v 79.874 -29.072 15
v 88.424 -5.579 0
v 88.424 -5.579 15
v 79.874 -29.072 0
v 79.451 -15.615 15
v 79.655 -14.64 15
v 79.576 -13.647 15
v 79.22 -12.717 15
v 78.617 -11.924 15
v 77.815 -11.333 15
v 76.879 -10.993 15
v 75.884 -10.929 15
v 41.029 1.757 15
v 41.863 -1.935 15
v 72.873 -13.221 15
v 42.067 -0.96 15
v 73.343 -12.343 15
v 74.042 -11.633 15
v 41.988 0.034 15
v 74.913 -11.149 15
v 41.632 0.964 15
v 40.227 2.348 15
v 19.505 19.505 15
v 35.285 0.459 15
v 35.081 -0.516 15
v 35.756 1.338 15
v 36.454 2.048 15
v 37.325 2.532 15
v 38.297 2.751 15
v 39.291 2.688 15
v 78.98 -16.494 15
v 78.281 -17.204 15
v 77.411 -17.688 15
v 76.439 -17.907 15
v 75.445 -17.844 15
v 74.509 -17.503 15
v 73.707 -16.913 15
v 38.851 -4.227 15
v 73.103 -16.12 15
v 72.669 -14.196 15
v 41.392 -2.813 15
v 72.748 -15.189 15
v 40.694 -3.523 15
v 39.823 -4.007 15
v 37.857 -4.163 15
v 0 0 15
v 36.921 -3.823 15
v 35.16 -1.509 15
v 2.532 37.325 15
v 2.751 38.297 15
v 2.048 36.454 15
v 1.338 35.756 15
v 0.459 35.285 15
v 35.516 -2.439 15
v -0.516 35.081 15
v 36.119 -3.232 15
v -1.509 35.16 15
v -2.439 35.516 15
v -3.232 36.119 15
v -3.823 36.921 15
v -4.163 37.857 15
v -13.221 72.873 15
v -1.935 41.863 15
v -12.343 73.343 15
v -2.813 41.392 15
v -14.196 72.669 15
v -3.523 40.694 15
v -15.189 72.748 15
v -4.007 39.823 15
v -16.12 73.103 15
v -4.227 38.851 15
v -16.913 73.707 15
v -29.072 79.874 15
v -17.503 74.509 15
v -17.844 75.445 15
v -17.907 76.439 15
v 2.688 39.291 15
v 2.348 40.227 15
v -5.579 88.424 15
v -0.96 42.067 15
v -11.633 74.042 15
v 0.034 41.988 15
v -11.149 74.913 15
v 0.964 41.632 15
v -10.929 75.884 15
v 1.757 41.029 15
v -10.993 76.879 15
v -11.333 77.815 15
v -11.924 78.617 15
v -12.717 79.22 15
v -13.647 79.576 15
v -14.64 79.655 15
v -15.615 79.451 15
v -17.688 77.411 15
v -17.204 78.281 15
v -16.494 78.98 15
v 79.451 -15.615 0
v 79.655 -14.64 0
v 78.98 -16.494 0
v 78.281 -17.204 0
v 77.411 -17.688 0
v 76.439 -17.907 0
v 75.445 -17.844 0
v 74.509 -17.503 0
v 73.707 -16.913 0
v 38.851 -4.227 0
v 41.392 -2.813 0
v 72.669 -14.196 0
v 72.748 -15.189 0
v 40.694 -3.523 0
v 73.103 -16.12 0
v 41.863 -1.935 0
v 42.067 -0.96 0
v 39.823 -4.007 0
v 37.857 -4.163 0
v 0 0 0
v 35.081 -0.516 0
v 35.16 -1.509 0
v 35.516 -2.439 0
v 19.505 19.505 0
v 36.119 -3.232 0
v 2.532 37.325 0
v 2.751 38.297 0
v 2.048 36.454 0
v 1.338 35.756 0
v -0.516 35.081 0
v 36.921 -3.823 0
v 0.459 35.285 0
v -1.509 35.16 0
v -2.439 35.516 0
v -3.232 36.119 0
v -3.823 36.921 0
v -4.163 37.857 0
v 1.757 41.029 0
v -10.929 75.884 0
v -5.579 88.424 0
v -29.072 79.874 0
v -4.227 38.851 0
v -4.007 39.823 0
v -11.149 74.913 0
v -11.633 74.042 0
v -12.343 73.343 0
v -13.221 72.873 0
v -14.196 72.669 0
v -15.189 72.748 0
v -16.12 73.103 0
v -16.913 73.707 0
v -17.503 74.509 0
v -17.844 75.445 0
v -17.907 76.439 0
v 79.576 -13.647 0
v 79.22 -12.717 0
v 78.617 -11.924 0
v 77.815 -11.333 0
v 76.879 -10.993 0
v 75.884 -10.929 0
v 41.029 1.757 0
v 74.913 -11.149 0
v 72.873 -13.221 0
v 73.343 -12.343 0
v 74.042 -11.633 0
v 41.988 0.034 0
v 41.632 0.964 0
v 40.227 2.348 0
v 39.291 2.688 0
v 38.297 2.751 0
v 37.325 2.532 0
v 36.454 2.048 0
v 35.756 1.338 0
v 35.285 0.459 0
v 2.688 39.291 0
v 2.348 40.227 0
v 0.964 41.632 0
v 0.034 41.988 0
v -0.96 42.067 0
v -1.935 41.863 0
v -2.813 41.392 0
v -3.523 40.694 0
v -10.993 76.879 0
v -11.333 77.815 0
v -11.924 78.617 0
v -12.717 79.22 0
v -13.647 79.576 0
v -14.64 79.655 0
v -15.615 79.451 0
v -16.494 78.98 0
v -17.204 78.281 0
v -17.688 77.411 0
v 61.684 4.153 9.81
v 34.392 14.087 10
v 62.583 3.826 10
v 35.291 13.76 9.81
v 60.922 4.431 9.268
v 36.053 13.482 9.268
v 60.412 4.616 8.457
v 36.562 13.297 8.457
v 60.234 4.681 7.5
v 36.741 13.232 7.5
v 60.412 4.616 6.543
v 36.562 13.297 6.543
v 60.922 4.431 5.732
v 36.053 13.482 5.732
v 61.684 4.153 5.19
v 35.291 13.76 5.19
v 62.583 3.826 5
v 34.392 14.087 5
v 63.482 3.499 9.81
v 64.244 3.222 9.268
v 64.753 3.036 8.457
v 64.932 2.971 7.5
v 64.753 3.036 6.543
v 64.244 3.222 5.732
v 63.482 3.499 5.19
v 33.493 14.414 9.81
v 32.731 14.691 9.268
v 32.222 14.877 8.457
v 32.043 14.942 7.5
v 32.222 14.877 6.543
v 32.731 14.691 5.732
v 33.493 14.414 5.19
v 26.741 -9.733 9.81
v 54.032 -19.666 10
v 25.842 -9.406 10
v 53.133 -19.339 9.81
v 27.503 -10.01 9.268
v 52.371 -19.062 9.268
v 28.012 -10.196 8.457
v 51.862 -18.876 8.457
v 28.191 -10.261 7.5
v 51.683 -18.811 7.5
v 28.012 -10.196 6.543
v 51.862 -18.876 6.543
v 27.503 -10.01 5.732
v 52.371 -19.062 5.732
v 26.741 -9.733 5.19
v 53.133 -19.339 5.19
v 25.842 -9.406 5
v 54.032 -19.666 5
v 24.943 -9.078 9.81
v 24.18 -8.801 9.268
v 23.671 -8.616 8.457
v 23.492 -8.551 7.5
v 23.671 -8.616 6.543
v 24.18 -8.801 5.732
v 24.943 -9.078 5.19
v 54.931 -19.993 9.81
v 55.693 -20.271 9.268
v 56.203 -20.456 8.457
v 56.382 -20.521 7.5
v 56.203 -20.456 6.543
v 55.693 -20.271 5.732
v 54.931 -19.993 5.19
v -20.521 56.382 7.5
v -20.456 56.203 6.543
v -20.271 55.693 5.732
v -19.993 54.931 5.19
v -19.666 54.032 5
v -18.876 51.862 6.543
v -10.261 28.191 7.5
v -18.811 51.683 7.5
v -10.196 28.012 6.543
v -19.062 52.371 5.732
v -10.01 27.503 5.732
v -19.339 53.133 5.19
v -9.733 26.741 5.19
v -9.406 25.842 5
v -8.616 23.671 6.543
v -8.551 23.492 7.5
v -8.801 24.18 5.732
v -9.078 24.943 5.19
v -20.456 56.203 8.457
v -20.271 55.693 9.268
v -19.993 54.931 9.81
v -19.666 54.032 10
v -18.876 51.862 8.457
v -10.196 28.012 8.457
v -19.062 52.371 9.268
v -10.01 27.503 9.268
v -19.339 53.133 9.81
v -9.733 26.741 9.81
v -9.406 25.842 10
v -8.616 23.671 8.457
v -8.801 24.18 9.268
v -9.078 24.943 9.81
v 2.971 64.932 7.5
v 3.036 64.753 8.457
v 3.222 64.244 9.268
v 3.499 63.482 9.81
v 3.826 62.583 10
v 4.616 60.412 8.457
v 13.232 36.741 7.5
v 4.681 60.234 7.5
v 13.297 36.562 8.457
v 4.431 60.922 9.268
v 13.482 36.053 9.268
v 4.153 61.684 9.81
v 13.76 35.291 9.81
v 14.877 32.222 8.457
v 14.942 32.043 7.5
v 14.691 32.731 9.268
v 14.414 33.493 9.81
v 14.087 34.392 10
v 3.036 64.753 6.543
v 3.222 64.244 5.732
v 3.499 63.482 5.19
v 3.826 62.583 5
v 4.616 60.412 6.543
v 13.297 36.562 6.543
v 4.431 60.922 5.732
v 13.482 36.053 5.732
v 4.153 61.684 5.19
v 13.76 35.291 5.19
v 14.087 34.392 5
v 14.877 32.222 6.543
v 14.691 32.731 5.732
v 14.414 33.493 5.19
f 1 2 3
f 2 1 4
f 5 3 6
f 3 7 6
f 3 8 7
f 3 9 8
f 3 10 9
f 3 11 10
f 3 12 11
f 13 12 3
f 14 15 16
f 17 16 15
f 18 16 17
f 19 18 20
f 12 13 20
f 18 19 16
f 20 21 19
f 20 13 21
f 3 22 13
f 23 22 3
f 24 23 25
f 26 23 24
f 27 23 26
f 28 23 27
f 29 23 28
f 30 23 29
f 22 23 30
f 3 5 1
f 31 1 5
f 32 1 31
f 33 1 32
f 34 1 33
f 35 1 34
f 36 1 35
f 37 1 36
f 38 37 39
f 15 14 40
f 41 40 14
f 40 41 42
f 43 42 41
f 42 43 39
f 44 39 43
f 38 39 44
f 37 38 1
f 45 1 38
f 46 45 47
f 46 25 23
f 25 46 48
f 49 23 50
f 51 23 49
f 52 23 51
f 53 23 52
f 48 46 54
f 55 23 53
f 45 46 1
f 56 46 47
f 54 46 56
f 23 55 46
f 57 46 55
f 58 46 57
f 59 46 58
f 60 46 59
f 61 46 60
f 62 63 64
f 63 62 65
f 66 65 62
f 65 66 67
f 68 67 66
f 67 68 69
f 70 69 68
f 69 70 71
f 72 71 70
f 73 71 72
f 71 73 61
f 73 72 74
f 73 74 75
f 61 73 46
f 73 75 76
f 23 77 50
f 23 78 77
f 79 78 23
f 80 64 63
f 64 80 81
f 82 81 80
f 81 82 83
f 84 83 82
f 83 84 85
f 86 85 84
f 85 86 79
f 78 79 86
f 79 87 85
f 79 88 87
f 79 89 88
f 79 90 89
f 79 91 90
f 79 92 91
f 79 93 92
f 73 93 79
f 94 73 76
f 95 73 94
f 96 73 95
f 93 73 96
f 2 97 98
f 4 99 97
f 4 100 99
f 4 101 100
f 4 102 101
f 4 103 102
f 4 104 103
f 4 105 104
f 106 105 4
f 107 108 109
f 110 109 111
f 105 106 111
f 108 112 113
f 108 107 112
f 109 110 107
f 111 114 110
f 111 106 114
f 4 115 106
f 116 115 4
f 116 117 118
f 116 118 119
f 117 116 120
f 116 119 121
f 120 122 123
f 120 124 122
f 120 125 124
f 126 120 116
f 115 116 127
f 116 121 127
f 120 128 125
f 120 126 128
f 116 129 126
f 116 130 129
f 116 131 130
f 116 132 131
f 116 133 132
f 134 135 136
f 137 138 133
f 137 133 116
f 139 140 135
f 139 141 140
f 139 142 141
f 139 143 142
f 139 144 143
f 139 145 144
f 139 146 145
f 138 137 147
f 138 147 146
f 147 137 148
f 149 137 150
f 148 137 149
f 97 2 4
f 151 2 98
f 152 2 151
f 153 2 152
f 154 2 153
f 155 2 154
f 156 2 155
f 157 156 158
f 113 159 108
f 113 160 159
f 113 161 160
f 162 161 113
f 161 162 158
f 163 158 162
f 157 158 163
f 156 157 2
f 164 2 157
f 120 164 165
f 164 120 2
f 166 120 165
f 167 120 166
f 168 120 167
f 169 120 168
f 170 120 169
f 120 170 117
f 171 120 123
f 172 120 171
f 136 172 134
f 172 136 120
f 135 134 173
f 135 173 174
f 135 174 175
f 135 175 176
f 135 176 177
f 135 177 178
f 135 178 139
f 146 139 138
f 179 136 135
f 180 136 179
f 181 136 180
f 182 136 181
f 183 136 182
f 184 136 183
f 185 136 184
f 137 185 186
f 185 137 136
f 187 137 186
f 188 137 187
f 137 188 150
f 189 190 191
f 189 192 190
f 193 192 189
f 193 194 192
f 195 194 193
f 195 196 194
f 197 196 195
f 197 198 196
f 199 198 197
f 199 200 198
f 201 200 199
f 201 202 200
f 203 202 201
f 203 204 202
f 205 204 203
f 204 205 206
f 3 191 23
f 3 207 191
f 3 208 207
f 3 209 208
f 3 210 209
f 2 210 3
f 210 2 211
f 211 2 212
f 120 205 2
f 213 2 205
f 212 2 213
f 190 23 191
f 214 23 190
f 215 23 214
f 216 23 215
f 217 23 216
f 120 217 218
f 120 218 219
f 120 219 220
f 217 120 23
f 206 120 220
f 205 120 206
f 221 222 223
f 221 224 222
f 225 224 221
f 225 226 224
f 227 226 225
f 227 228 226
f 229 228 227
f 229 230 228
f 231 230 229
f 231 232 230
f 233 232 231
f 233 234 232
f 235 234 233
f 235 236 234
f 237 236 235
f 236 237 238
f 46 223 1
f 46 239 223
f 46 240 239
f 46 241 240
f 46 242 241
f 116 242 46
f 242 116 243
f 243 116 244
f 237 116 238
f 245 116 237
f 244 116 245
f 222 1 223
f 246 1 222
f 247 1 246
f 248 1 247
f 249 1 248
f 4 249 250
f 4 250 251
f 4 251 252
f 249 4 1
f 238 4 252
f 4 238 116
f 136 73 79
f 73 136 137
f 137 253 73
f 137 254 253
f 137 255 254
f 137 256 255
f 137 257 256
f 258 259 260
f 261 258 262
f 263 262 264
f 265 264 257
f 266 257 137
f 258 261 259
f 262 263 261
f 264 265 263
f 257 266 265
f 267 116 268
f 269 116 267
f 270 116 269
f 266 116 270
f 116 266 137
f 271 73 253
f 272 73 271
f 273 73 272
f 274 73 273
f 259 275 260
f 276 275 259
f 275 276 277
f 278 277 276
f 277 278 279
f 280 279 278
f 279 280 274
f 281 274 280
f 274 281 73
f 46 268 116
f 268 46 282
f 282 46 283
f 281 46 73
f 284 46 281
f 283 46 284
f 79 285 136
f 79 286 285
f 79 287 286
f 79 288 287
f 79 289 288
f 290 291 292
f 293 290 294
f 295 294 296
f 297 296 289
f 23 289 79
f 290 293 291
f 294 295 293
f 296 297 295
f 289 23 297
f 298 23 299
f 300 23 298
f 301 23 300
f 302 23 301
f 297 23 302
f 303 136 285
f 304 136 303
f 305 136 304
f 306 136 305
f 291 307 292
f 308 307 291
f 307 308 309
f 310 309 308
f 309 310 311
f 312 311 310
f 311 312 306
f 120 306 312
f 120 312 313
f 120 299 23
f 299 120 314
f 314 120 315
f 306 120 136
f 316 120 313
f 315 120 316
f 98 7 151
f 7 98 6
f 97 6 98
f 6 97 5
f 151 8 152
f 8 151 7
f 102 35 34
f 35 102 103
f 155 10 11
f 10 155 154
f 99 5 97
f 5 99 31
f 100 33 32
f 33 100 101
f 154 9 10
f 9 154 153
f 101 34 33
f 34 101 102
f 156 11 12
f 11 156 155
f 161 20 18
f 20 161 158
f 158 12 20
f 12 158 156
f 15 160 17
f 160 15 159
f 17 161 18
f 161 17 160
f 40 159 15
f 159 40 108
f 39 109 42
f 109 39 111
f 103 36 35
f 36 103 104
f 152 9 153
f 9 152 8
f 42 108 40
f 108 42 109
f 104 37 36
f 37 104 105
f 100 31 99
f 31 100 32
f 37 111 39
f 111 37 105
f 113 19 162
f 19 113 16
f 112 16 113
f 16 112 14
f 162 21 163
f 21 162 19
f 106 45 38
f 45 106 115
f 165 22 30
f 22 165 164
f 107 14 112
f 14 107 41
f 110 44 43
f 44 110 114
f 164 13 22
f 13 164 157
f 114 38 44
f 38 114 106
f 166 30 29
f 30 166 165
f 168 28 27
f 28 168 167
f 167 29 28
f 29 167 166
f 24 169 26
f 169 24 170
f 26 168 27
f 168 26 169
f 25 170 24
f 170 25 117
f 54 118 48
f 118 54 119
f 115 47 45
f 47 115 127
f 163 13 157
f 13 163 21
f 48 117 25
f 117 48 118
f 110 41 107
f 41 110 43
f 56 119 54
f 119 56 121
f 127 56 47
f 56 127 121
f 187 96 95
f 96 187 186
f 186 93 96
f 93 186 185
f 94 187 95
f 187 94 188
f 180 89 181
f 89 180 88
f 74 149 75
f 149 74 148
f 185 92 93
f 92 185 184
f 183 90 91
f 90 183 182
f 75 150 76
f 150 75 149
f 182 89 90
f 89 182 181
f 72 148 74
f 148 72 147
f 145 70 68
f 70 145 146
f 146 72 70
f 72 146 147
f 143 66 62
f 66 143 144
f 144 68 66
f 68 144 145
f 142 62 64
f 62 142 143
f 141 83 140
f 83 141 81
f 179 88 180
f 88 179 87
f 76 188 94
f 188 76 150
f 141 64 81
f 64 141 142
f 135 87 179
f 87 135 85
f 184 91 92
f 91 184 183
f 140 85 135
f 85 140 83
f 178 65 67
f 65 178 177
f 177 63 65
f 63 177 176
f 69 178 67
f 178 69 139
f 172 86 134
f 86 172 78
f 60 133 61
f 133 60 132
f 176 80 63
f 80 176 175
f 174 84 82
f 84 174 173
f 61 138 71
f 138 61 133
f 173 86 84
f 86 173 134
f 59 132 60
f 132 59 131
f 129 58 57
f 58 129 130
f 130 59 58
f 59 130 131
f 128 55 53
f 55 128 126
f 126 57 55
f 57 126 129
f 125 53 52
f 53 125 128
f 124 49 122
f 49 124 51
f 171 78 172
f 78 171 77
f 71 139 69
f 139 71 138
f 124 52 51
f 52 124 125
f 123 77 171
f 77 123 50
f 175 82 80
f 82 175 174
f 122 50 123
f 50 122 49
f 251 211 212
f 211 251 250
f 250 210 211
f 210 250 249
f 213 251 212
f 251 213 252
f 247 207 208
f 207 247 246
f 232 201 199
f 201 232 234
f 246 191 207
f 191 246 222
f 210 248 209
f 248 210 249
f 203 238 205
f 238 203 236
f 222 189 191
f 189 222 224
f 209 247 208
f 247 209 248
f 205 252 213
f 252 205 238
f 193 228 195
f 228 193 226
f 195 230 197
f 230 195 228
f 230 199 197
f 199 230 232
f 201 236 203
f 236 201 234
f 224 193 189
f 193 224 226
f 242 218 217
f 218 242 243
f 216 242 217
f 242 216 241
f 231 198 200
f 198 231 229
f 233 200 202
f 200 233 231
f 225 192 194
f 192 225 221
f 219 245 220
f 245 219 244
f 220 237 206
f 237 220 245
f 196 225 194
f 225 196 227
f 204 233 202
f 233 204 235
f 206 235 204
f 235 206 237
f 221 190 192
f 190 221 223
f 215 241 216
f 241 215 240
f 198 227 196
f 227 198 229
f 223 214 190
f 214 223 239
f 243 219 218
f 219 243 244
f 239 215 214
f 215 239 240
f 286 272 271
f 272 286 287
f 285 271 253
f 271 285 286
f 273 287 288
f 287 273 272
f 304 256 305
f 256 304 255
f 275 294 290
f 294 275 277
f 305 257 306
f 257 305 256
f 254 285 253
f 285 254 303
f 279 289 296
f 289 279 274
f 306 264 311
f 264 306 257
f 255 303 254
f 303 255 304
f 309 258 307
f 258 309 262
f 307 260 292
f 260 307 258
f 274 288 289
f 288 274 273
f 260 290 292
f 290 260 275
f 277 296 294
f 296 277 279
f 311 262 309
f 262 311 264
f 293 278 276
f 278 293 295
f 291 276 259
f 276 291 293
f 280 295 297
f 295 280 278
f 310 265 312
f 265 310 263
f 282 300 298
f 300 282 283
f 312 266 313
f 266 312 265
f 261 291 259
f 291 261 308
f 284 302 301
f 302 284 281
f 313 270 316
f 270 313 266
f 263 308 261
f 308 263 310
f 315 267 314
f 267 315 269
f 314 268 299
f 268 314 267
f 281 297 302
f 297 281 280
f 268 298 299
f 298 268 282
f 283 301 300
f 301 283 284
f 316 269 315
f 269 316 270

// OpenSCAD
/*
 *  Universal Angle (Winkel) by RoHa
 *  http://www.thingiverse.com/thing:1398497
 *
 *  Historiy:
 *  2016-03-07  ReleaseV1
 *
 */

Angle = 130; // [90:180]
SideA_Length = 8.5;
SideA_Width = 1.5;
SideA_Height = 2.5;
SideB_Length = 8.5;
SideB_Width = 1.5;
SideB_Height = 2.5;
Hole1A_Show = "yes"; // [yes,no]
Hole1A_Offset = 0.5;
Hole1A_Diameter = 0.7;
Hole2A_Show = "yes"; // [yes,no]
Hole2A_Offset = 4.5;
Hole2A_Diameter = 0.7;
Hole3B_Show = "yes"; // [yes,no]
Hole3B_Offset = 0.5;
Hole3B_Diameter = 0.7;
Hole4B_Show = "yes"; // [yes,no]
Hole4B_Offset = 4.5;
Hole4B_Diameter = 0.7;
Hole5A_Show = "yes"; // [yes,no]
Hole5A_Offset = 2.5;
Hole5A_Diameter = 0.5;
Hole6A_Show = "yes"; // [yes,no]
Hole6A_Offset = 5.5;
Hole6A_Diameter = 0.5;
Hole7B_Show = "yes"; // [yes,no]
Hole7B_Offset = 2.5;
Hole7B_Diameter = 0.5;
Hole8B_Show = "yes"; // [yes,no]
Hole8B_Offset = 5.5;
Hole8B_Diameter = 0.5;
Hole_Detail = 0.1;
Printer_X = 15;
Printer_Y = 15;
Printer_Z = 0;
Version = 1; // [1]
dx = Printer_X;
dy = Printer_Y;
dz = Printer_Z;
wg = Angle;
wal = SideA_Length;
wab = SideA_Width;
wah = SideA_Height;
wbl = SideB_Length;
wbb = SideB_Width;
wbh = SideB_Height;
wlg = Hole_Detail;
wl1a = Hole1A_Offset;
wl1r = Hole1A_Diameter/2;
wl2a = Hole2A_Offset;
wl2r = Hole2A_Diameter/2;
wl3a = Hole3B_Offset;
wl3r = Hole3B_Diameter/2;
wl4a = Hole4B_Offset;
wl4r = Hole4B_Diameter/2;
wl5a = Hole5A_Offset;
wl5r = Hole5A_Diameter/2;
wl6a = Hole6A_Offset;
wl6r = Hole6A_Diameter/2;
wl7a = Hole7B_Offset;
wl7r = Hole7B_Diameter/2;
wl8a = Hole8B_Offset;
wl8r = Hole8B_Diameter/2;
bugfix = 0.1;

// Skalierung von MM in CM
scale(10)
union() {
  // Druckbett visualisieren
  if (dz>0) {
    druckbett();
  }
  // fuer optimalen Druck ausrichten
  rotate([0,0,-wg/2+45]) 
  // >>> LoecherB-Innen ausschneiden
  rotate([0,0,wg]) 
  rotate([90,0,0]) 
  translate([0,wbb,-bugfix/2])
  difference() {
  translate([0,-wbb,bugfix/2])
  rotate([-90,0,0]) 
  rotate([0,0,-wg]) 
    // >>> LoecherA-Innen ausschneiden
    rotate([-90,0,0]) 
    difference() {
      rotate([90,0,0]) 
      union () {
        // >>> LoecherB-Aussen ausschneiden
        rotate([0,0,wg]) 
        difference() {
          rotate([0,0,-wg]) 
          difference() {
            // Basismodell fuer Winkel
            winkel_basis();
            // >>> LoecherA-Aussen ausschneiden
            if (Hole1A_Show == "yes") {
              color("blue")
              translate([wal-wl1a-wl1r,wah/2,0])
              cylinder(wab,wl1r,wl1r,$fs=wlg);
            }
            if (Hole2A_Show == "yes") {
              color("blue")
              translate([wal-wl2a-wl2r,wah/2,0])
              cylinder(wab,wl2r,wl2r,$fs=wlg);
            }
            // <<< LoecherA-Aussen
          }
          // LoecherB
          if (Hole3B_Show == "yes") {
            color("blue")
            translate([wbl-wl3a-wl3r,-wbh/2,0])
            cylinder(wbb,wl3r,wl3r,$fs=wlg);
          }
          if (Hole4B_Show == "yes") {
            color("blue")
            translate([wbl-wl4a-wl4r,-wbh/2,0])
            cylinder(wbb,wl4r,wl4r,$fs=wlg);
          }
        }
        // <<< LoecherB-Aussen
      }
      // LoecherA
      if (Hole5A_Show == "yes") {
        color("blue")
        translate([wal-wl5a-wl5r,-wab/2,0])
        cylinder(wah,wl5r,wl5r,$fs=wlg);
      }
      if (Hole6A_Show == "yes") {
        color("blue")
        translate([wal-wl6a-wl6r,-wab/2,0])
        cylinder(wah,wl6r,wl6r,$fs=wlg);
      }
    }
    // <<< LoecherA-Innen
    // LoecherB
    if (Hole7B_Show == "yes") {
      color("blue")
      translate([wbl-wl7a-wl7r,-wbb/2,0])
      cylinder(wbh+bugfix,wl7r,wl7r,$fs=wlg);
    }
    if (Hole8B_Show == "yes") {
      color("blue")
      translate([wbl-wl8a-wl8r,-wbb/2,0])
      cylinder(wbh+bugfix,wl8r,wl8r,$fs=wlg);
    }
  }
  // >>> LoecherB-Innen
}

// Winkel
module winkel_basis() {
  union() {
    cube([wal,wah,wab]);
    color("red") 
    translate([0,0,wbb])
    rotate([180,0,0]) 
    rotate([0,0,-wg]) 
    cube([wbl,wbh,wbb]);
  }
}

// Druckbett
module druckbett() {
  color("gray")
  translate([-dx/2,-dy/2,-1])
  cube([dx,dy,1]);
}
